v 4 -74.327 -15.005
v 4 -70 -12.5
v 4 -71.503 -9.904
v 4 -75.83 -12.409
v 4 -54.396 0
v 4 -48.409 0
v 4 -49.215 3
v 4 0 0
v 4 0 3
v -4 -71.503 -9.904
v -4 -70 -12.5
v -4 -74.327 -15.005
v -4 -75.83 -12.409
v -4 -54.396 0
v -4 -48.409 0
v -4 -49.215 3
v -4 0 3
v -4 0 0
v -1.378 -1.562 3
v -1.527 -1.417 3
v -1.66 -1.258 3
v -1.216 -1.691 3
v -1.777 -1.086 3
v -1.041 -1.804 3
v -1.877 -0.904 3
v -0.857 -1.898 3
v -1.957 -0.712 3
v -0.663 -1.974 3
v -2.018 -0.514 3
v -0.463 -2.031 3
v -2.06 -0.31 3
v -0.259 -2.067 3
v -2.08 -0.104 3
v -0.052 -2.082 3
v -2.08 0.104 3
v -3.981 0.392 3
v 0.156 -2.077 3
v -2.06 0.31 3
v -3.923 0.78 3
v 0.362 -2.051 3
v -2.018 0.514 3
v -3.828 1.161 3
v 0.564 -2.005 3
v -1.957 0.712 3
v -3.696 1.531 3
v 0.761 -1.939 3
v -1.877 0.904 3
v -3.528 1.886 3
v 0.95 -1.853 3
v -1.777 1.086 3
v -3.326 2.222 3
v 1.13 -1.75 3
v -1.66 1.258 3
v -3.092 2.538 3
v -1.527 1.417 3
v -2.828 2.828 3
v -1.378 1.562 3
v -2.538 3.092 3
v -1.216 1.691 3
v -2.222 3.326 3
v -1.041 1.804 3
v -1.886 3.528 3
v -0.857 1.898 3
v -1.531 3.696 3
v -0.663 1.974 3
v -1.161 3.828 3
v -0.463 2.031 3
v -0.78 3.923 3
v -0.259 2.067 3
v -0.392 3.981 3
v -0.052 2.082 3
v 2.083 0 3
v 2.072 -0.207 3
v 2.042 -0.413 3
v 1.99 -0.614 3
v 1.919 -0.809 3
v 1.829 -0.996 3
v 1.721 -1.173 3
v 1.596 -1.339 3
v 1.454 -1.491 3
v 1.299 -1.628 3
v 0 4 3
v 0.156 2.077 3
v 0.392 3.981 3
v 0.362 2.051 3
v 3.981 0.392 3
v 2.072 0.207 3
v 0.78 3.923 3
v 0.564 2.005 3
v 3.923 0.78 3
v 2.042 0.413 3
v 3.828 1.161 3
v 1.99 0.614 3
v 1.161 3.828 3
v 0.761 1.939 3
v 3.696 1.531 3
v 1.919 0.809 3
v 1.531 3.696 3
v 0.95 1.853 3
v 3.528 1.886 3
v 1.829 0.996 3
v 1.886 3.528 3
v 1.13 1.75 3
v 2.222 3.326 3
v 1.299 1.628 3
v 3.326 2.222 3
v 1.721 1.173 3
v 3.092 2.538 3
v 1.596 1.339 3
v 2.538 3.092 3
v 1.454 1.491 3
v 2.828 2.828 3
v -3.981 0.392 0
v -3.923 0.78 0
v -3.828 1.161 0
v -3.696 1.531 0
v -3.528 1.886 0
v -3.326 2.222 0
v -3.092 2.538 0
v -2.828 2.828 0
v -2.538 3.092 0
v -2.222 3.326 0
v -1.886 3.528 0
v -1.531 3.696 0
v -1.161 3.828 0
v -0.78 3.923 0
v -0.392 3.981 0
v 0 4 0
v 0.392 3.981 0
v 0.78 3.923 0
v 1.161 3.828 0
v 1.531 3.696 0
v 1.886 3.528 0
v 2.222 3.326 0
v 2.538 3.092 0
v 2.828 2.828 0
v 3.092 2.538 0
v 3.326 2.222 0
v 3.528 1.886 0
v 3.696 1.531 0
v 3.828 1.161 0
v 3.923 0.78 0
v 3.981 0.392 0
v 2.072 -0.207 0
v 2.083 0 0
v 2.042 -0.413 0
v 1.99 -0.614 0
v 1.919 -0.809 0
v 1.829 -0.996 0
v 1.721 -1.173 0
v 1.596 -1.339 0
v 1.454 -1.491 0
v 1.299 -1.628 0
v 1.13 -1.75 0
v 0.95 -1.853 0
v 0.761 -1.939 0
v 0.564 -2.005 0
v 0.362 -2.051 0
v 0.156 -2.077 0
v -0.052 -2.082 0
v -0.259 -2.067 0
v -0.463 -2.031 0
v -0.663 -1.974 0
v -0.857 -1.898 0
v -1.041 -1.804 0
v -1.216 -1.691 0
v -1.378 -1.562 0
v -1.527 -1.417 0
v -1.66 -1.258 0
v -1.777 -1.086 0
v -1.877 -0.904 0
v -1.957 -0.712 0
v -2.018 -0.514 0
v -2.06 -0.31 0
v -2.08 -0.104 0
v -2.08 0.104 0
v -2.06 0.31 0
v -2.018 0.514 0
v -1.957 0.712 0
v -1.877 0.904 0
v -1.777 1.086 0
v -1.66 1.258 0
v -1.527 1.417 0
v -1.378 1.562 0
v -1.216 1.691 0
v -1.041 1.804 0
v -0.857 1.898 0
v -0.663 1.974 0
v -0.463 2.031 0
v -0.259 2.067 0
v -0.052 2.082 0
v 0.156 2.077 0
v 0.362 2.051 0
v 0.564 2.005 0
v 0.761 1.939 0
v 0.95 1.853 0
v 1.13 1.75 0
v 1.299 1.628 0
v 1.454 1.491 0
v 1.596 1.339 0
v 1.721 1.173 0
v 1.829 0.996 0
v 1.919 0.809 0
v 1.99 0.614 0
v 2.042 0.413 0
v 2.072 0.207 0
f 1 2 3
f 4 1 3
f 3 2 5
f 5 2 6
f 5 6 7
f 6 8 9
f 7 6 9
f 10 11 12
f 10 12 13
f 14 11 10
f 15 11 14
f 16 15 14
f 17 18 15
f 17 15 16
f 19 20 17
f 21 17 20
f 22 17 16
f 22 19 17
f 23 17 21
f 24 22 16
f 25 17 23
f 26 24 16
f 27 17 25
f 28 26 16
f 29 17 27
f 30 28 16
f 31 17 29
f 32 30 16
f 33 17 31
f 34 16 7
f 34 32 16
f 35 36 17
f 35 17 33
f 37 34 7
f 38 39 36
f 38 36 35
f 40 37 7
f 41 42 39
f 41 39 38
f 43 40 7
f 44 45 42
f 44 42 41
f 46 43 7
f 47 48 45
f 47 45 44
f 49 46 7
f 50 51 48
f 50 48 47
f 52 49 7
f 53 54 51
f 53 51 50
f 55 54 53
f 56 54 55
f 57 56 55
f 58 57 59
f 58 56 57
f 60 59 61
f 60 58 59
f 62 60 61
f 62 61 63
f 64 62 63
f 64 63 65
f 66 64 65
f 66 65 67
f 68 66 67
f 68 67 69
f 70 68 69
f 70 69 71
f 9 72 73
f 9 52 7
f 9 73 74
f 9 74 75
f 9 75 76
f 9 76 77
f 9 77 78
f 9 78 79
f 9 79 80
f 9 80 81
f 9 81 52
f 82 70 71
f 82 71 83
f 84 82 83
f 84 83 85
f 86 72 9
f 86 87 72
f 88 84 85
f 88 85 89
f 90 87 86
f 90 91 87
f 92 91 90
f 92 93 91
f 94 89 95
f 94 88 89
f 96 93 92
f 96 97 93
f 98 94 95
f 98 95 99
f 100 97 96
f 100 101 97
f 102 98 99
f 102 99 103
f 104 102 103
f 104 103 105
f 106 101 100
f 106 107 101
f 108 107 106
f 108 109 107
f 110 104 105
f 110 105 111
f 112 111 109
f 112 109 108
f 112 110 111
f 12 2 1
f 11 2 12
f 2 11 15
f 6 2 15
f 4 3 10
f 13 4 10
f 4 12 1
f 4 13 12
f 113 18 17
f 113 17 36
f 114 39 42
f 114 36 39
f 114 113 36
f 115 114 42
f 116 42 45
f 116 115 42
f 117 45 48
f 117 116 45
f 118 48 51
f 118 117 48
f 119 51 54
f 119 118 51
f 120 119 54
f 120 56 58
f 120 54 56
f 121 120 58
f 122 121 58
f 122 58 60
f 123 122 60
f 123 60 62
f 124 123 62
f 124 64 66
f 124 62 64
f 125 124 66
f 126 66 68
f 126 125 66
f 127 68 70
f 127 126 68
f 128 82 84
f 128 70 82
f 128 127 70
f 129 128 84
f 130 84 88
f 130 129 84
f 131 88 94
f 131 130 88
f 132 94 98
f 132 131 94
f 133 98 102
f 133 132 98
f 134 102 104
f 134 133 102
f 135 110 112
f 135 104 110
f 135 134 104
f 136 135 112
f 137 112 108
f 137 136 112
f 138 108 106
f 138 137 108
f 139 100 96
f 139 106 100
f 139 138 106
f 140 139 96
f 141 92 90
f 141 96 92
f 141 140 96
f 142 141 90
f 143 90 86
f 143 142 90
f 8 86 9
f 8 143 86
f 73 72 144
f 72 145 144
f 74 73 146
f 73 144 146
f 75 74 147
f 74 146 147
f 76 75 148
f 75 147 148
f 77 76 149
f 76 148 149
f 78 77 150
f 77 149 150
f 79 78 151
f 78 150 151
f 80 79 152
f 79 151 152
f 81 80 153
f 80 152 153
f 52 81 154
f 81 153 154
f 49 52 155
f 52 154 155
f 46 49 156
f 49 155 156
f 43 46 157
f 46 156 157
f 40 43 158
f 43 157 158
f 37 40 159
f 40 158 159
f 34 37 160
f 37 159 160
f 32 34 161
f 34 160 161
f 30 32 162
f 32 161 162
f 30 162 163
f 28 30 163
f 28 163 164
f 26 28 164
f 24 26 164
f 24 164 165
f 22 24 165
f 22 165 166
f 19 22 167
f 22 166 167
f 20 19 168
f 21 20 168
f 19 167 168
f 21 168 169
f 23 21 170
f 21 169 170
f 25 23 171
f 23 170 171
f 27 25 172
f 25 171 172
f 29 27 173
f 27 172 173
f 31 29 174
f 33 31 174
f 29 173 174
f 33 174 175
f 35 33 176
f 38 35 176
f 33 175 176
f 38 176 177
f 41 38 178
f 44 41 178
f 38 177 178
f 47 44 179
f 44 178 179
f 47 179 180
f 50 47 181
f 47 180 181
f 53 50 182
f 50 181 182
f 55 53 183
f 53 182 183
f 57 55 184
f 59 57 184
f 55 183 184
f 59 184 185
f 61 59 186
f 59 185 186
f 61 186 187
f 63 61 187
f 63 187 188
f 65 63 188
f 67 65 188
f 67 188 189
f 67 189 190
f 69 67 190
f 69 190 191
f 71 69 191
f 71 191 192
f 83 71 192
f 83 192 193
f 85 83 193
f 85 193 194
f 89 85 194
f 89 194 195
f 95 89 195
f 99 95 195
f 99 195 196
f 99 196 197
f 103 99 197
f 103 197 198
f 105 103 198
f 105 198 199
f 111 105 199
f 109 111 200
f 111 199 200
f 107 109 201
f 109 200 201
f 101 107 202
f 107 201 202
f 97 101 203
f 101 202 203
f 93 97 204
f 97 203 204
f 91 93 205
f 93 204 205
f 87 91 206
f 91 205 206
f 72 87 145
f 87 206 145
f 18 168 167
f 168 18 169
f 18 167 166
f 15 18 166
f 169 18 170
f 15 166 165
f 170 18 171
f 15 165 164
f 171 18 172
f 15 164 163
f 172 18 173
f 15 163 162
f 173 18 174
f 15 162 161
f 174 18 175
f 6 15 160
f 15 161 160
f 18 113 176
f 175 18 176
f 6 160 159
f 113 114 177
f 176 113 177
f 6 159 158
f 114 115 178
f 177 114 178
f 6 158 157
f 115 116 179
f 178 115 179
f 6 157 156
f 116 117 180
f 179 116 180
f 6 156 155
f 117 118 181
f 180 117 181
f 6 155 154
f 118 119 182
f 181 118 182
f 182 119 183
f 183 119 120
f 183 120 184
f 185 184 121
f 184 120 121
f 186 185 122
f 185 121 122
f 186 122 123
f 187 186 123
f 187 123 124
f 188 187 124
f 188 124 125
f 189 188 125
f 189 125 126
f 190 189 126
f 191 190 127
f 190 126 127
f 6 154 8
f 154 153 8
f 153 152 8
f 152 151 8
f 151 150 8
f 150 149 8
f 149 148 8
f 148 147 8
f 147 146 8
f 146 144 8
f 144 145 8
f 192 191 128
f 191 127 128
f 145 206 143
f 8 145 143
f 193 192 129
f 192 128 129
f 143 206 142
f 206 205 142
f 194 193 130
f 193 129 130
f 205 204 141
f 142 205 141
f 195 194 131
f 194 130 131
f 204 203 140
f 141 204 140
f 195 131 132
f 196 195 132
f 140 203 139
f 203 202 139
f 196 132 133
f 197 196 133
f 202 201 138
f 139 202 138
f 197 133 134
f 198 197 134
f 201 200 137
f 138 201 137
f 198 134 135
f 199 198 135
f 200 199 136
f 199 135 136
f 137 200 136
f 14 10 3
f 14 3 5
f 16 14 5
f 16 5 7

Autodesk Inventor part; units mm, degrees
ref_plane "YZ Plane" through (0, 0, 0) normal (1, 0, 0) x (0, 1, 0)
ref_plane "XZ Plane" through (0, 0, 0) normal (0, 1, 0) x (-1, 0, 0)
ref_plane "XY Plane" through (0, 0, 0) normal (0, 0, 1) x (1, 0, 0)
sketch "Sketch1" plane through (0, 0, 0) normal (0, 0, 1) x (1, 0, 0)
  circle A0 centre (0, 0) radius 2.0828
  dimension "d0" = 4.1656
sketch "Sketch2" plane through (0, 0, 0) normal (0, 0, 1) x (1, 0, 0)
  circle A0 centre (0, 0) radius 4
  dimension "d1" = 8
extrude "Extrusion1" add sketch "Sketch2" along normal blind 3
sketch "Sketch3" plane through (0, 0, 3) normal (0, 0, 1) x (1, 0, 0)
  circle A0 centre (0, 0) radius 4 projected
  line L0 (-4, 0) -> (4, 0)
  line L1 (4, 0) -> (4, -70)
  line L2 (4, -70) -> (-4, -70)
  line L3 (-4, -70) -> (-4, 0)
  dimension "d4" = 70
extrude "Extrusion2" add sketch "Sketch3" against normal blind 3 contours L1 L2 L3 A0
extrude "Extrusion3" cut sketch "Sketch1" along normal blind 5
sketch "Sketch4" plane through (-4, -70, 3) normal (-1, 0, 0) x (0, 0, 1)
  line L0 (-3, 0) -> (-3, 70) projected
  line L1 (-3, 0) -> (-15.5, 0)
  line L2 (-15.5, 0) -> (-3, 21.5912)
  line L3 (-15.5, 0) -> (-12.9037, -1.5031)
  line L4 (-12.9037, -1.5031) -> (-3, 15.6035)
  dimension "d9" = 12.5
  dimension "d10" = 3
extrude "Extrusion4" add sketch "Sketch4" against normal blind 8 contours L4 L1 L2 L0 | L4 L3 L1
sketch "Sketch5" plane through (-4, -70, 3) normal (-1, 0, 0) x (0, 0, 1)
  line L0 (-3, 15.6035) -> (-12.9037, -1.5031) projected
  line L1 (-3.8073, 14.2091) -> (2.2743, 24.7138)
  line L2 (2.2743, 24.7138) -> (2.8326, -0.03)
  line L3 (2.8326, -0.03) -> (-4.8388, -0.2031)
  line L4 (-4.8388, -0.2031) -> (-3.8073, 14.2091)
  point P0 (-3, 70)
extrude "Extrusion5" cut sketch "Sketch5" against normal blind 8
sketch "Sketch6" plane through (-4, -70, -12.5) normal (0, -0.8654, -0.501) x (1, 0, 0)
  line L0 (0, 0) -> (0, 3) projected
  line L1 (8, 0) -> (0, 0) projected
  line L2 (0, 0) -> (8, 0)
  line L3 (8, 0) -> (8, 3)
  line L4 (8, 3) -> (0, 3)
  line L5 (0, 3) -> (0, 0)
  point P0 (4, -24.2544)
extrude "Extrusion6" add sketch "Sketch6" along normal blind 5
properties part number "Thumb"
